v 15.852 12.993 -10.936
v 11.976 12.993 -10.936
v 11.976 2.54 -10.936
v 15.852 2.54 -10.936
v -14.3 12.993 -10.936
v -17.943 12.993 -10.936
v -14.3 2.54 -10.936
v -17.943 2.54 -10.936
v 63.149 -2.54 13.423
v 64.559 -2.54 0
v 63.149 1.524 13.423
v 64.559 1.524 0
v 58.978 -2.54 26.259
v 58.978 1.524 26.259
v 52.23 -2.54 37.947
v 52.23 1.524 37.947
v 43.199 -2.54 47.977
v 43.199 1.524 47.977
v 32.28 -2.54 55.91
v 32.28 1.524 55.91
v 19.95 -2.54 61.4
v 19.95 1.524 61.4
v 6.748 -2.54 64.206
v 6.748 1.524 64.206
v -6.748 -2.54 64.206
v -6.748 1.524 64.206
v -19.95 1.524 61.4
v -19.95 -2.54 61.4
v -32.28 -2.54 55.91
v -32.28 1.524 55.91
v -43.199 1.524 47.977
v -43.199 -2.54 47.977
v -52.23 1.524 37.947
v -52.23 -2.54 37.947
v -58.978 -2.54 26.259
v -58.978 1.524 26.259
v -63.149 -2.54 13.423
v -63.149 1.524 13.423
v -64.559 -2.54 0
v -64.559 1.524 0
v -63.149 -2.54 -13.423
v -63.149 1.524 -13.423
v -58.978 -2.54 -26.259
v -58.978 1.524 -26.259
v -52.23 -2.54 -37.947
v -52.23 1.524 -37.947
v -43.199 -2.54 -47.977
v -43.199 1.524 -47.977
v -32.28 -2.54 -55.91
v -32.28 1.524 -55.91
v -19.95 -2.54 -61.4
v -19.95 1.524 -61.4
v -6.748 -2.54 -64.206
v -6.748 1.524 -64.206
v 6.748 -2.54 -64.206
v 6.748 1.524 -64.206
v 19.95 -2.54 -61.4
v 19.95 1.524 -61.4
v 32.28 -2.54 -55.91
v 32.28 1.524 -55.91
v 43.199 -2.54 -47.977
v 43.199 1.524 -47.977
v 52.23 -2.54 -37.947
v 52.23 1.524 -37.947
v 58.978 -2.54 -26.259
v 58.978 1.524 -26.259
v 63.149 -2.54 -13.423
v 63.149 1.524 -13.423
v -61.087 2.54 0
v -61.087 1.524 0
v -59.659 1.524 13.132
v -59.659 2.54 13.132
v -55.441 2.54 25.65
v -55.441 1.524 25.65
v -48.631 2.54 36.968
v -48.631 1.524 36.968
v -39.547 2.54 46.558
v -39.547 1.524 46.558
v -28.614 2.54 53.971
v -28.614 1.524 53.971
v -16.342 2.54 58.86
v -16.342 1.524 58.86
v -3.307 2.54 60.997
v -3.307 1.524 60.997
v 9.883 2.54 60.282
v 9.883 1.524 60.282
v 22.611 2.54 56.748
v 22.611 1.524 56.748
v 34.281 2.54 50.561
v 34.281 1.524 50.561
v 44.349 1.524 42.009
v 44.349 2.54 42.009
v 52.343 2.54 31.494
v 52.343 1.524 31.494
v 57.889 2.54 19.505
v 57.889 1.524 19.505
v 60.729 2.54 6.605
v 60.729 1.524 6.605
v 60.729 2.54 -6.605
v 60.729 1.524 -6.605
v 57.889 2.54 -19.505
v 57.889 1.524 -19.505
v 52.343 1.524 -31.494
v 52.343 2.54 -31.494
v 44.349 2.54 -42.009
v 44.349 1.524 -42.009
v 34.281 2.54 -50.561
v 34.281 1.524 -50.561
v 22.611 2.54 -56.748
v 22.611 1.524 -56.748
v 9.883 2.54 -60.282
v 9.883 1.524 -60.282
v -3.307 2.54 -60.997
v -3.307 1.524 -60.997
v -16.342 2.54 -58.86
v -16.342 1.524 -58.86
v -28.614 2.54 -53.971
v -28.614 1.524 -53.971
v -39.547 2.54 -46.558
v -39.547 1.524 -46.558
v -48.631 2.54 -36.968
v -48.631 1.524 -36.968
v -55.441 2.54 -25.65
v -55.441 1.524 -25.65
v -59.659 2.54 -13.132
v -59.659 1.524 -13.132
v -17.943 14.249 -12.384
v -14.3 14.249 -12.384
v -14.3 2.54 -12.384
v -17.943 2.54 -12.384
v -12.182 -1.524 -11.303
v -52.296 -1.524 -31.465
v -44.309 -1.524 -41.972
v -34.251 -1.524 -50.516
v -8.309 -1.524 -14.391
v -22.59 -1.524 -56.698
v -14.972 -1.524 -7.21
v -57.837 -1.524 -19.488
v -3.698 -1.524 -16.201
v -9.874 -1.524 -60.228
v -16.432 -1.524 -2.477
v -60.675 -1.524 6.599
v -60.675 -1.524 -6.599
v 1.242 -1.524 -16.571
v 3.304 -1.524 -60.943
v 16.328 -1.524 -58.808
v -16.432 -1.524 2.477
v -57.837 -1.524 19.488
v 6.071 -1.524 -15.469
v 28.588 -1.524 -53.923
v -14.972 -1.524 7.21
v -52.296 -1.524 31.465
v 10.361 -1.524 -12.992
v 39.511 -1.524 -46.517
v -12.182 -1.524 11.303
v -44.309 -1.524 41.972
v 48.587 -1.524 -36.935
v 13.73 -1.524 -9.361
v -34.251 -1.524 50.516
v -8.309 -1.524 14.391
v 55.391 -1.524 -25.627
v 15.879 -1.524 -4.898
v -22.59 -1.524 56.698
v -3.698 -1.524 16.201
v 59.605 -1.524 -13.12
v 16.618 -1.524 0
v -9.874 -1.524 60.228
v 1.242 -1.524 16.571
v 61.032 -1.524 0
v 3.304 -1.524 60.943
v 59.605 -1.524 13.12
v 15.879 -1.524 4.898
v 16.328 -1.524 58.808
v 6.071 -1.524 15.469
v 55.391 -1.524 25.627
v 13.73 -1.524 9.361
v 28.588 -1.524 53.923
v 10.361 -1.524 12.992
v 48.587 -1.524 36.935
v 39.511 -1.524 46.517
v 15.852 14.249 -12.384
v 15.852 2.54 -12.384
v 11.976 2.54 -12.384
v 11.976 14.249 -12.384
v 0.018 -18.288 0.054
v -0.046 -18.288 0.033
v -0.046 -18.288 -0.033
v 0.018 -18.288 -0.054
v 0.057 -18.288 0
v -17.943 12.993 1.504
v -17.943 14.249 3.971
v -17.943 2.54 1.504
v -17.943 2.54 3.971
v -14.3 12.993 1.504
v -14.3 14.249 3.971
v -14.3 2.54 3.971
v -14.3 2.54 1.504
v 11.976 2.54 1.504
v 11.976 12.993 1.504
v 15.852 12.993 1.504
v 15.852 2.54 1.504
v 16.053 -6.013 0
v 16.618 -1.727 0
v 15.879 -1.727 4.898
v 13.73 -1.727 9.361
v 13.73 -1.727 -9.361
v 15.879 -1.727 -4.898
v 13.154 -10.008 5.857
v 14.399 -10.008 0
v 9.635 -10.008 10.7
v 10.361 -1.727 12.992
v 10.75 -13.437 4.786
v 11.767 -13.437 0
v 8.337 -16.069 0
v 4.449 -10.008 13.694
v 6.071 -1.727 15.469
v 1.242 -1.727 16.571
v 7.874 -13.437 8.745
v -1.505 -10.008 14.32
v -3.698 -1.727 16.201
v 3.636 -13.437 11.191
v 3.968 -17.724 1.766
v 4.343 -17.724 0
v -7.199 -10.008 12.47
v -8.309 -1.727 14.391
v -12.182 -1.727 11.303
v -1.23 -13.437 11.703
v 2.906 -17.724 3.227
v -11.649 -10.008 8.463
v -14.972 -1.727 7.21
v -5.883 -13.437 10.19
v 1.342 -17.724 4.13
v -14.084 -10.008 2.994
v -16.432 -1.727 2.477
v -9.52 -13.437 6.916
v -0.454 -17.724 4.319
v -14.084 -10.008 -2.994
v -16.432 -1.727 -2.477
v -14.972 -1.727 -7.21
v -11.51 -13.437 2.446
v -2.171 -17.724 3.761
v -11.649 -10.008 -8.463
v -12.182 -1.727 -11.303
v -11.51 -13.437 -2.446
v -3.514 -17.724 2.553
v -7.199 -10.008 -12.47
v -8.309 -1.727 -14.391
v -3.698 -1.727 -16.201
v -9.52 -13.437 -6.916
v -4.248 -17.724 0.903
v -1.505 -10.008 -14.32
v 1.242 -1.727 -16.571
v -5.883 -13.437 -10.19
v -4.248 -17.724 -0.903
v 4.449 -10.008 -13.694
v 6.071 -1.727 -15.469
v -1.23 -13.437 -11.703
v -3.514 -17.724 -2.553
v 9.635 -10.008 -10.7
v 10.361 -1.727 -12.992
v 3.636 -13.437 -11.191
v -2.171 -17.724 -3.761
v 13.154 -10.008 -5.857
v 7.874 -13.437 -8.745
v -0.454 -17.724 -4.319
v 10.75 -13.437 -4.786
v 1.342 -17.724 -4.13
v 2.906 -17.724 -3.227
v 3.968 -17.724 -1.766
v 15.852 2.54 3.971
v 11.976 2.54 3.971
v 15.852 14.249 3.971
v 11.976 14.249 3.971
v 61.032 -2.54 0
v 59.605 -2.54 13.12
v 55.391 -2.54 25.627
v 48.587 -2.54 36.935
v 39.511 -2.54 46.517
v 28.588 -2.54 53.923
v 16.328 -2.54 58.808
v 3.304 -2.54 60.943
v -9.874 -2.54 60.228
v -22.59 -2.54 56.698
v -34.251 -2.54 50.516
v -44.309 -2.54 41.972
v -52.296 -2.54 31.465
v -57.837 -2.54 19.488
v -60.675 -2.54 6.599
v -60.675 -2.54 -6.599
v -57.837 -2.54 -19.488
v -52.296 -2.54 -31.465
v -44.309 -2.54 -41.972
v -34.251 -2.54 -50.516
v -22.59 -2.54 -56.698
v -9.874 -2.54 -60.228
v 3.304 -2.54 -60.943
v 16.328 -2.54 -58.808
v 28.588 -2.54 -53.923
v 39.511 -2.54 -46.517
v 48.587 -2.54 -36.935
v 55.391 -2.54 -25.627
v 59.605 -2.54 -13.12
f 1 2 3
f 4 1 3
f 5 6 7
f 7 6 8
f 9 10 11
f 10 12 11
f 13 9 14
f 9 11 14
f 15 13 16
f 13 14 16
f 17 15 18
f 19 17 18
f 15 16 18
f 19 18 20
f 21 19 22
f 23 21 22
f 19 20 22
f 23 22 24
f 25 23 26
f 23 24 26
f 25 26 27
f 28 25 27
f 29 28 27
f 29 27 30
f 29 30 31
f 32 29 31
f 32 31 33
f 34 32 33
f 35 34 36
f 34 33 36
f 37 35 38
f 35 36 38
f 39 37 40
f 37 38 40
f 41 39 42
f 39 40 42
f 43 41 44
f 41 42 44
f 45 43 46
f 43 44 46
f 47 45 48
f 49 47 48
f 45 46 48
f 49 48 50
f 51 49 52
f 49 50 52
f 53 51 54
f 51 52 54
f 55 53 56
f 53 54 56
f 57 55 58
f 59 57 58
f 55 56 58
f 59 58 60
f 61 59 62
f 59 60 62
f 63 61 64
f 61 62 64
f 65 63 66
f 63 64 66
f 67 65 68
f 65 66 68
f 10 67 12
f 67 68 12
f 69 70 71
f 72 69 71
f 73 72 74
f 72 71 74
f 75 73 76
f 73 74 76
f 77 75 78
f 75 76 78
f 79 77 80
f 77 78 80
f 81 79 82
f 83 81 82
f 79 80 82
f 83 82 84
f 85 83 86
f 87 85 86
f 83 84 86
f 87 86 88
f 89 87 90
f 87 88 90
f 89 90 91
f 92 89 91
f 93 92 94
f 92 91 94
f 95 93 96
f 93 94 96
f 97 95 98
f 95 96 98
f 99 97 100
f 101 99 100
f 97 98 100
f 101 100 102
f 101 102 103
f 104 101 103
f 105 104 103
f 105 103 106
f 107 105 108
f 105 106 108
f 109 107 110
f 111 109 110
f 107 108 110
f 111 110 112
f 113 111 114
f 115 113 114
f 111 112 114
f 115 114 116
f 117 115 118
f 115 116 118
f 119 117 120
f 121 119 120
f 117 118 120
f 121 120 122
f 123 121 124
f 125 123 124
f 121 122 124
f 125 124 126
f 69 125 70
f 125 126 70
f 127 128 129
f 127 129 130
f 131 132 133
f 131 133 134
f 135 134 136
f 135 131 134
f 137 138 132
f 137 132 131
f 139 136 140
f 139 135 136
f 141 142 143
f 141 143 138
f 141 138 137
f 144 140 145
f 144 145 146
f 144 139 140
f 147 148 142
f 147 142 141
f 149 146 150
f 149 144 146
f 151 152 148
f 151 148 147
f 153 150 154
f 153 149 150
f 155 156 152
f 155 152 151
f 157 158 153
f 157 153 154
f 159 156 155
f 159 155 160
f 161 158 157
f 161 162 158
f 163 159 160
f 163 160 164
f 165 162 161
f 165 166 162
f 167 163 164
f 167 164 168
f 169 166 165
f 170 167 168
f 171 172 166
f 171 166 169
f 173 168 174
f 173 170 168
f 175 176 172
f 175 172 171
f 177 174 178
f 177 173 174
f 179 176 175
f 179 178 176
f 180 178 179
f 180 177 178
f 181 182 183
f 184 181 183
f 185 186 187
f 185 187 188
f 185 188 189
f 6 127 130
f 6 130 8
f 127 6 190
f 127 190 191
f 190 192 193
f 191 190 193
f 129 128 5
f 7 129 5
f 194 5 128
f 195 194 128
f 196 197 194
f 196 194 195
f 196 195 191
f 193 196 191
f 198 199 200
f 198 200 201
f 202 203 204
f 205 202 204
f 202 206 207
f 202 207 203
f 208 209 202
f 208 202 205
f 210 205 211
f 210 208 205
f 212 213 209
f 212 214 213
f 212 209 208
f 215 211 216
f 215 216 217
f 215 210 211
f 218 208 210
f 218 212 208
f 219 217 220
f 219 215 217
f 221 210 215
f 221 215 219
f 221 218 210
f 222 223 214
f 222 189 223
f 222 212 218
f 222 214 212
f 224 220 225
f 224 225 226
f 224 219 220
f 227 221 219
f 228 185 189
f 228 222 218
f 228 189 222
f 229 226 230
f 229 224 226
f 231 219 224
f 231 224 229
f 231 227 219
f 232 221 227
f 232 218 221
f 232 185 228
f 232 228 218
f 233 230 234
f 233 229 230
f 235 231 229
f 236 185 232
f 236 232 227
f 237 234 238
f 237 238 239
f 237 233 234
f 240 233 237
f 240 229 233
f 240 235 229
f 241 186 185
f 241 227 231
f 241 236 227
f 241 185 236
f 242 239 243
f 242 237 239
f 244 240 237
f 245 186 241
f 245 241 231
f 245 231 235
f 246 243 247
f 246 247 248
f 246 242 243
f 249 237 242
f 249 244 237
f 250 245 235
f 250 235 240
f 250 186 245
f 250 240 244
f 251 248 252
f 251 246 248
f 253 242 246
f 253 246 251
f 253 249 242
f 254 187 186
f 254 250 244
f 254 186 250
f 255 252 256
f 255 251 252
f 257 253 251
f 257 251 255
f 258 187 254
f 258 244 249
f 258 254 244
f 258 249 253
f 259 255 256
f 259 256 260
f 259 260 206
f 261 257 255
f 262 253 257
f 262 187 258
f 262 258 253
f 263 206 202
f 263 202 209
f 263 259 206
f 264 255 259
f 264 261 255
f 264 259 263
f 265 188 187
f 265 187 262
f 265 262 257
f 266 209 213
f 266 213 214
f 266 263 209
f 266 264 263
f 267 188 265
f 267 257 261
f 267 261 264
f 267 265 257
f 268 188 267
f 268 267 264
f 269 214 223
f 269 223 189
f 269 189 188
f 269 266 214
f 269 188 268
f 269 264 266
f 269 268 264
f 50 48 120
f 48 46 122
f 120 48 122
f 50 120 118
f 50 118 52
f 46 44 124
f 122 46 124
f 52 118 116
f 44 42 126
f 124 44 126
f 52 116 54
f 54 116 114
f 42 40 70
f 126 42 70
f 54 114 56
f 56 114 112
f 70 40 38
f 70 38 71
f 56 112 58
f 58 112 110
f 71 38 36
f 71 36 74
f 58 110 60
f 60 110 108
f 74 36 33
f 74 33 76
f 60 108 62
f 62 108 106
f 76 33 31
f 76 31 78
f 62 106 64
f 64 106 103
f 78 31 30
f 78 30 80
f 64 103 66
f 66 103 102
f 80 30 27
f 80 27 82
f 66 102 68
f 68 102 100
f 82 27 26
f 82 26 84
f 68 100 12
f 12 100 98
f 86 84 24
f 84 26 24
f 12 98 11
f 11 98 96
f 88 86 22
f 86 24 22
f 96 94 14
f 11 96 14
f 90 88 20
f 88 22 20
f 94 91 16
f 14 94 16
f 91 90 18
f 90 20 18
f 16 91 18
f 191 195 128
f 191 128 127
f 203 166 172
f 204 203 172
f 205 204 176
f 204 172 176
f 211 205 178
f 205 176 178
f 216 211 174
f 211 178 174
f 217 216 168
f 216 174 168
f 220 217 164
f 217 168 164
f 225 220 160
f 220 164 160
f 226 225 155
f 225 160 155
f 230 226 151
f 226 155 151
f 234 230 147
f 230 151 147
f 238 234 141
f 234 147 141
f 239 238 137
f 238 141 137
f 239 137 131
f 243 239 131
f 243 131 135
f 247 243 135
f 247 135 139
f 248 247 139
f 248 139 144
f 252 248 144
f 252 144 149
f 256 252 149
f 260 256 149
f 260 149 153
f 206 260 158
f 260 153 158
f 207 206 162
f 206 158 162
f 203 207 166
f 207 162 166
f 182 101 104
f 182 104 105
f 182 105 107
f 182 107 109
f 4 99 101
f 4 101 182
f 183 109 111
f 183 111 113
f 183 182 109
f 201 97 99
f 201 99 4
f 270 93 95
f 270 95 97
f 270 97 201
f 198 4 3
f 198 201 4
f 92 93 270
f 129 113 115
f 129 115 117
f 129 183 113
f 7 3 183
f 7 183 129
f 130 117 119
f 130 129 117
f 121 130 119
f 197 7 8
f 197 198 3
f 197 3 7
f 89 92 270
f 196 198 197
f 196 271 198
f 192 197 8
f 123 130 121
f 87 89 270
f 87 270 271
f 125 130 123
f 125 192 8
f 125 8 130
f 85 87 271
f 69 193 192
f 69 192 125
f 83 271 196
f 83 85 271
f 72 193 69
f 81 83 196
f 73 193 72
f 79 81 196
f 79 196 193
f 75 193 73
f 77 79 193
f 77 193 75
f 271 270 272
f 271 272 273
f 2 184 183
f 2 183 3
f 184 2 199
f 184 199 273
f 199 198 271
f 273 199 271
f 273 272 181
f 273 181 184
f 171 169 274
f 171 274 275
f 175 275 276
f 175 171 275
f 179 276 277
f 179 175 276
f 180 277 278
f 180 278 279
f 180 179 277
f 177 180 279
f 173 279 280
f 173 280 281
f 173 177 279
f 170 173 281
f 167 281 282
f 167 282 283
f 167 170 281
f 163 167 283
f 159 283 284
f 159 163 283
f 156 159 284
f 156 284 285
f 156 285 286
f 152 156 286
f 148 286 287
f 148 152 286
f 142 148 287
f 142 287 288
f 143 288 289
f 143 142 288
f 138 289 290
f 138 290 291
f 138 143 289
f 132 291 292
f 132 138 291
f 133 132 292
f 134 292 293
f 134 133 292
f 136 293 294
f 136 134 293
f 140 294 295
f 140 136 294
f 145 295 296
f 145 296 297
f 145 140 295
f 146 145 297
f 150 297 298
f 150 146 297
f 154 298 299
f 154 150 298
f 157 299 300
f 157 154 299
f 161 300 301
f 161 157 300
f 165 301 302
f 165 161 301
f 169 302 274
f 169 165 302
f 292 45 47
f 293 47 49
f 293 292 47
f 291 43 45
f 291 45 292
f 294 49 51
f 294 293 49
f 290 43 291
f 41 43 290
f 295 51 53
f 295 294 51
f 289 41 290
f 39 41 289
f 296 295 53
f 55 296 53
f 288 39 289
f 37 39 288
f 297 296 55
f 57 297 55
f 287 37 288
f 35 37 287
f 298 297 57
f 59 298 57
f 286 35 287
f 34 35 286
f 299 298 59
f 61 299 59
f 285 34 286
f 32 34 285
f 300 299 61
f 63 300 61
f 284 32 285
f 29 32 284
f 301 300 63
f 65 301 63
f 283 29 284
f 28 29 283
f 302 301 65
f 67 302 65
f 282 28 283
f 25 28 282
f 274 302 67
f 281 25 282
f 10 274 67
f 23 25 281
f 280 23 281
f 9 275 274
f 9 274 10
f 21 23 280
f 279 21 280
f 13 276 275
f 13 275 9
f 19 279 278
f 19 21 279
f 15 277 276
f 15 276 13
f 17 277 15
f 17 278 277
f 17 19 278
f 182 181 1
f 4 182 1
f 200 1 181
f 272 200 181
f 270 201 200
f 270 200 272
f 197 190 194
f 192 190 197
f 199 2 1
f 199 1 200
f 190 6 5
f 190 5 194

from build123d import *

# Parameters (mm, degrees)
F0_R      = 64.5594783813
F1_DEPTH  = 1.524
F2_R      = 64.5594783813
F2_R_2    = 61.0323113023
F3_DEPTH  = 1.016
F4_R      = 16.6175214607
F5_DEPTH  = 16.764
F6_R      = 16.5608
F7_R      = 61.0868628562
F8_DEPTH  = 1.016
F13_W     = 3.8755843416
F13_H     = 16.3549613208
F13_W_2   = 3.6430479959
F14_DEPTH = 11.7094
F15_W     = 10.4532966083
F15_H     = 12.4406219693
F16_DEPTH = 37.6174


# Not quite as in the source:
# - the program builds the solid bodies; features that only make, move or delete a surface that nothing else refers to are left out


with BuildPart() as f1:
    # F0 (on Front) → F1 (new body, symmetric)
    with BuildSketch(Plane.XZ):
        Circle(F0_R)
    extrude(amount=F1_DEPTH, both=True)

    # F2 (on face) → F3 (join)
    with BuildSketch(Plane.XZ.offset(1.524)):
        Circle(F2_R)
        Circle(F2_R_2, mode=Mode.SUBTRACT)
    extrude(amount=F3_DEPTH)

    # F4 (on face) → F5 (join)
    with BuildSketch(Plane.XZ.offset(1.524)):
        Circle(F4_R)
    extrude(amount=F5_DEPTH)

    # F6
    f6_edges = [f1.edges().sort_by_distance(p)[0] for p in [
        (-16.617521, -18.288, 0),
    ]]
    fillet(f6_edges, radius=F6_R)

    # F7 (on face) → F8 (join)
    with BuildSketch(Plane(origin=(0, 1.524, 0), x_dir=(-1, 0, 0), z_dir=(0, 1, 0))):
        Circle(F7_R)
    extrude(amount=F8_DEPTH)

    # F13 (on face) → F14 (join)
    with BuildSketch(Plane(origin=(0, 2.54, 0), x_dir=(-1, 0, 0), z_dir=(0, 1, 0))):
        with Locations((-13.9141972177, -4.206892103)):
            Rectangle(F13_W, F13_H)
        with Locations((16.1215732805, -4.206892103)):
            Rectangle(F13_W_2, F13_H)
    extrude(amount=F14_DEPTH)

    # F15 (on face) → F16 (cut)
    with BuildSketch(Plane(origin=(-17.9430972785, 0, 0), x_dir=(0, -1, 0), z_dir=(-1, 0, 0))):
        with Locations((-7.7666483042, -4.7159082606)):
            Rectangle(F15_W, F15_H)
    extrude(amount=-F16_DEPTH, mode=Mode.SUBTRACT)


solid = f1.part
